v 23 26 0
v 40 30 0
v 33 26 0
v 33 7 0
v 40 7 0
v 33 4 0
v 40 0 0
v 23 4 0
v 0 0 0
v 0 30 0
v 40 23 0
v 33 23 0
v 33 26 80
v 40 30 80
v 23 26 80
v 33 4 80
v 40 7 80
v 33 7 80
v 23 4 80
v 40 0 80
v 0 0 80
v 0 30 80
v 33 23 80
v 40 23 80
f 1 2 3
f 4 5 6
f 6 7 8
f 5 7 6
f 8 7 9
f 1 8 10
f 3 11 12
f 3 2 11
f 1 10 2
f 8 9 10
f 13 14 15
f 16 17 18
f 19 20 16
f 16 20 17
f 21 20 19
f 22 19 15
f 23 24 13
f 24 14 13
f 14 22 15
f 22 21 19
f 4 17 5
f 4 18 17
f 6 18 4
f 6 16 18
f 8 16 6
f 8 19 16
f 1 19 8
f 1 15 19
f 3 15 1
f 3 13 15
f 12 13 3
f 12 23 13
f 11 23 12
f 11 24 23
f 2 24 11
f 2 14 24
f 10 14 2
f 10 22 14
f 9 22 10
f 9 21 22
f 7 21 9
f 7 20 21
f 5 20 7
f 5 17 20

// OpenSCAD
$fn = 32;

// ----------------------------------------------------------------------
// T-slot rail: 40 x 30 mm section, 80 mm long
// ----------------------------------------------------------------------

// --- parameters (mm) ---
profile_height = 80;      // extrusion height
profile_points = 12;      // points of the closed outline

profile = [[0, 0], [40, 0], [40, 7], [33, 7], [33, 4], [23, 4], [23, 26], [33, 26], [33, 23], [40, 23], [40, 30], [0, 30]];  // single closed polygon, 12 points, counter clockwise

// --- the one profile operation ---
linear_extrude(height = profile_height) polygon(points = profile);
